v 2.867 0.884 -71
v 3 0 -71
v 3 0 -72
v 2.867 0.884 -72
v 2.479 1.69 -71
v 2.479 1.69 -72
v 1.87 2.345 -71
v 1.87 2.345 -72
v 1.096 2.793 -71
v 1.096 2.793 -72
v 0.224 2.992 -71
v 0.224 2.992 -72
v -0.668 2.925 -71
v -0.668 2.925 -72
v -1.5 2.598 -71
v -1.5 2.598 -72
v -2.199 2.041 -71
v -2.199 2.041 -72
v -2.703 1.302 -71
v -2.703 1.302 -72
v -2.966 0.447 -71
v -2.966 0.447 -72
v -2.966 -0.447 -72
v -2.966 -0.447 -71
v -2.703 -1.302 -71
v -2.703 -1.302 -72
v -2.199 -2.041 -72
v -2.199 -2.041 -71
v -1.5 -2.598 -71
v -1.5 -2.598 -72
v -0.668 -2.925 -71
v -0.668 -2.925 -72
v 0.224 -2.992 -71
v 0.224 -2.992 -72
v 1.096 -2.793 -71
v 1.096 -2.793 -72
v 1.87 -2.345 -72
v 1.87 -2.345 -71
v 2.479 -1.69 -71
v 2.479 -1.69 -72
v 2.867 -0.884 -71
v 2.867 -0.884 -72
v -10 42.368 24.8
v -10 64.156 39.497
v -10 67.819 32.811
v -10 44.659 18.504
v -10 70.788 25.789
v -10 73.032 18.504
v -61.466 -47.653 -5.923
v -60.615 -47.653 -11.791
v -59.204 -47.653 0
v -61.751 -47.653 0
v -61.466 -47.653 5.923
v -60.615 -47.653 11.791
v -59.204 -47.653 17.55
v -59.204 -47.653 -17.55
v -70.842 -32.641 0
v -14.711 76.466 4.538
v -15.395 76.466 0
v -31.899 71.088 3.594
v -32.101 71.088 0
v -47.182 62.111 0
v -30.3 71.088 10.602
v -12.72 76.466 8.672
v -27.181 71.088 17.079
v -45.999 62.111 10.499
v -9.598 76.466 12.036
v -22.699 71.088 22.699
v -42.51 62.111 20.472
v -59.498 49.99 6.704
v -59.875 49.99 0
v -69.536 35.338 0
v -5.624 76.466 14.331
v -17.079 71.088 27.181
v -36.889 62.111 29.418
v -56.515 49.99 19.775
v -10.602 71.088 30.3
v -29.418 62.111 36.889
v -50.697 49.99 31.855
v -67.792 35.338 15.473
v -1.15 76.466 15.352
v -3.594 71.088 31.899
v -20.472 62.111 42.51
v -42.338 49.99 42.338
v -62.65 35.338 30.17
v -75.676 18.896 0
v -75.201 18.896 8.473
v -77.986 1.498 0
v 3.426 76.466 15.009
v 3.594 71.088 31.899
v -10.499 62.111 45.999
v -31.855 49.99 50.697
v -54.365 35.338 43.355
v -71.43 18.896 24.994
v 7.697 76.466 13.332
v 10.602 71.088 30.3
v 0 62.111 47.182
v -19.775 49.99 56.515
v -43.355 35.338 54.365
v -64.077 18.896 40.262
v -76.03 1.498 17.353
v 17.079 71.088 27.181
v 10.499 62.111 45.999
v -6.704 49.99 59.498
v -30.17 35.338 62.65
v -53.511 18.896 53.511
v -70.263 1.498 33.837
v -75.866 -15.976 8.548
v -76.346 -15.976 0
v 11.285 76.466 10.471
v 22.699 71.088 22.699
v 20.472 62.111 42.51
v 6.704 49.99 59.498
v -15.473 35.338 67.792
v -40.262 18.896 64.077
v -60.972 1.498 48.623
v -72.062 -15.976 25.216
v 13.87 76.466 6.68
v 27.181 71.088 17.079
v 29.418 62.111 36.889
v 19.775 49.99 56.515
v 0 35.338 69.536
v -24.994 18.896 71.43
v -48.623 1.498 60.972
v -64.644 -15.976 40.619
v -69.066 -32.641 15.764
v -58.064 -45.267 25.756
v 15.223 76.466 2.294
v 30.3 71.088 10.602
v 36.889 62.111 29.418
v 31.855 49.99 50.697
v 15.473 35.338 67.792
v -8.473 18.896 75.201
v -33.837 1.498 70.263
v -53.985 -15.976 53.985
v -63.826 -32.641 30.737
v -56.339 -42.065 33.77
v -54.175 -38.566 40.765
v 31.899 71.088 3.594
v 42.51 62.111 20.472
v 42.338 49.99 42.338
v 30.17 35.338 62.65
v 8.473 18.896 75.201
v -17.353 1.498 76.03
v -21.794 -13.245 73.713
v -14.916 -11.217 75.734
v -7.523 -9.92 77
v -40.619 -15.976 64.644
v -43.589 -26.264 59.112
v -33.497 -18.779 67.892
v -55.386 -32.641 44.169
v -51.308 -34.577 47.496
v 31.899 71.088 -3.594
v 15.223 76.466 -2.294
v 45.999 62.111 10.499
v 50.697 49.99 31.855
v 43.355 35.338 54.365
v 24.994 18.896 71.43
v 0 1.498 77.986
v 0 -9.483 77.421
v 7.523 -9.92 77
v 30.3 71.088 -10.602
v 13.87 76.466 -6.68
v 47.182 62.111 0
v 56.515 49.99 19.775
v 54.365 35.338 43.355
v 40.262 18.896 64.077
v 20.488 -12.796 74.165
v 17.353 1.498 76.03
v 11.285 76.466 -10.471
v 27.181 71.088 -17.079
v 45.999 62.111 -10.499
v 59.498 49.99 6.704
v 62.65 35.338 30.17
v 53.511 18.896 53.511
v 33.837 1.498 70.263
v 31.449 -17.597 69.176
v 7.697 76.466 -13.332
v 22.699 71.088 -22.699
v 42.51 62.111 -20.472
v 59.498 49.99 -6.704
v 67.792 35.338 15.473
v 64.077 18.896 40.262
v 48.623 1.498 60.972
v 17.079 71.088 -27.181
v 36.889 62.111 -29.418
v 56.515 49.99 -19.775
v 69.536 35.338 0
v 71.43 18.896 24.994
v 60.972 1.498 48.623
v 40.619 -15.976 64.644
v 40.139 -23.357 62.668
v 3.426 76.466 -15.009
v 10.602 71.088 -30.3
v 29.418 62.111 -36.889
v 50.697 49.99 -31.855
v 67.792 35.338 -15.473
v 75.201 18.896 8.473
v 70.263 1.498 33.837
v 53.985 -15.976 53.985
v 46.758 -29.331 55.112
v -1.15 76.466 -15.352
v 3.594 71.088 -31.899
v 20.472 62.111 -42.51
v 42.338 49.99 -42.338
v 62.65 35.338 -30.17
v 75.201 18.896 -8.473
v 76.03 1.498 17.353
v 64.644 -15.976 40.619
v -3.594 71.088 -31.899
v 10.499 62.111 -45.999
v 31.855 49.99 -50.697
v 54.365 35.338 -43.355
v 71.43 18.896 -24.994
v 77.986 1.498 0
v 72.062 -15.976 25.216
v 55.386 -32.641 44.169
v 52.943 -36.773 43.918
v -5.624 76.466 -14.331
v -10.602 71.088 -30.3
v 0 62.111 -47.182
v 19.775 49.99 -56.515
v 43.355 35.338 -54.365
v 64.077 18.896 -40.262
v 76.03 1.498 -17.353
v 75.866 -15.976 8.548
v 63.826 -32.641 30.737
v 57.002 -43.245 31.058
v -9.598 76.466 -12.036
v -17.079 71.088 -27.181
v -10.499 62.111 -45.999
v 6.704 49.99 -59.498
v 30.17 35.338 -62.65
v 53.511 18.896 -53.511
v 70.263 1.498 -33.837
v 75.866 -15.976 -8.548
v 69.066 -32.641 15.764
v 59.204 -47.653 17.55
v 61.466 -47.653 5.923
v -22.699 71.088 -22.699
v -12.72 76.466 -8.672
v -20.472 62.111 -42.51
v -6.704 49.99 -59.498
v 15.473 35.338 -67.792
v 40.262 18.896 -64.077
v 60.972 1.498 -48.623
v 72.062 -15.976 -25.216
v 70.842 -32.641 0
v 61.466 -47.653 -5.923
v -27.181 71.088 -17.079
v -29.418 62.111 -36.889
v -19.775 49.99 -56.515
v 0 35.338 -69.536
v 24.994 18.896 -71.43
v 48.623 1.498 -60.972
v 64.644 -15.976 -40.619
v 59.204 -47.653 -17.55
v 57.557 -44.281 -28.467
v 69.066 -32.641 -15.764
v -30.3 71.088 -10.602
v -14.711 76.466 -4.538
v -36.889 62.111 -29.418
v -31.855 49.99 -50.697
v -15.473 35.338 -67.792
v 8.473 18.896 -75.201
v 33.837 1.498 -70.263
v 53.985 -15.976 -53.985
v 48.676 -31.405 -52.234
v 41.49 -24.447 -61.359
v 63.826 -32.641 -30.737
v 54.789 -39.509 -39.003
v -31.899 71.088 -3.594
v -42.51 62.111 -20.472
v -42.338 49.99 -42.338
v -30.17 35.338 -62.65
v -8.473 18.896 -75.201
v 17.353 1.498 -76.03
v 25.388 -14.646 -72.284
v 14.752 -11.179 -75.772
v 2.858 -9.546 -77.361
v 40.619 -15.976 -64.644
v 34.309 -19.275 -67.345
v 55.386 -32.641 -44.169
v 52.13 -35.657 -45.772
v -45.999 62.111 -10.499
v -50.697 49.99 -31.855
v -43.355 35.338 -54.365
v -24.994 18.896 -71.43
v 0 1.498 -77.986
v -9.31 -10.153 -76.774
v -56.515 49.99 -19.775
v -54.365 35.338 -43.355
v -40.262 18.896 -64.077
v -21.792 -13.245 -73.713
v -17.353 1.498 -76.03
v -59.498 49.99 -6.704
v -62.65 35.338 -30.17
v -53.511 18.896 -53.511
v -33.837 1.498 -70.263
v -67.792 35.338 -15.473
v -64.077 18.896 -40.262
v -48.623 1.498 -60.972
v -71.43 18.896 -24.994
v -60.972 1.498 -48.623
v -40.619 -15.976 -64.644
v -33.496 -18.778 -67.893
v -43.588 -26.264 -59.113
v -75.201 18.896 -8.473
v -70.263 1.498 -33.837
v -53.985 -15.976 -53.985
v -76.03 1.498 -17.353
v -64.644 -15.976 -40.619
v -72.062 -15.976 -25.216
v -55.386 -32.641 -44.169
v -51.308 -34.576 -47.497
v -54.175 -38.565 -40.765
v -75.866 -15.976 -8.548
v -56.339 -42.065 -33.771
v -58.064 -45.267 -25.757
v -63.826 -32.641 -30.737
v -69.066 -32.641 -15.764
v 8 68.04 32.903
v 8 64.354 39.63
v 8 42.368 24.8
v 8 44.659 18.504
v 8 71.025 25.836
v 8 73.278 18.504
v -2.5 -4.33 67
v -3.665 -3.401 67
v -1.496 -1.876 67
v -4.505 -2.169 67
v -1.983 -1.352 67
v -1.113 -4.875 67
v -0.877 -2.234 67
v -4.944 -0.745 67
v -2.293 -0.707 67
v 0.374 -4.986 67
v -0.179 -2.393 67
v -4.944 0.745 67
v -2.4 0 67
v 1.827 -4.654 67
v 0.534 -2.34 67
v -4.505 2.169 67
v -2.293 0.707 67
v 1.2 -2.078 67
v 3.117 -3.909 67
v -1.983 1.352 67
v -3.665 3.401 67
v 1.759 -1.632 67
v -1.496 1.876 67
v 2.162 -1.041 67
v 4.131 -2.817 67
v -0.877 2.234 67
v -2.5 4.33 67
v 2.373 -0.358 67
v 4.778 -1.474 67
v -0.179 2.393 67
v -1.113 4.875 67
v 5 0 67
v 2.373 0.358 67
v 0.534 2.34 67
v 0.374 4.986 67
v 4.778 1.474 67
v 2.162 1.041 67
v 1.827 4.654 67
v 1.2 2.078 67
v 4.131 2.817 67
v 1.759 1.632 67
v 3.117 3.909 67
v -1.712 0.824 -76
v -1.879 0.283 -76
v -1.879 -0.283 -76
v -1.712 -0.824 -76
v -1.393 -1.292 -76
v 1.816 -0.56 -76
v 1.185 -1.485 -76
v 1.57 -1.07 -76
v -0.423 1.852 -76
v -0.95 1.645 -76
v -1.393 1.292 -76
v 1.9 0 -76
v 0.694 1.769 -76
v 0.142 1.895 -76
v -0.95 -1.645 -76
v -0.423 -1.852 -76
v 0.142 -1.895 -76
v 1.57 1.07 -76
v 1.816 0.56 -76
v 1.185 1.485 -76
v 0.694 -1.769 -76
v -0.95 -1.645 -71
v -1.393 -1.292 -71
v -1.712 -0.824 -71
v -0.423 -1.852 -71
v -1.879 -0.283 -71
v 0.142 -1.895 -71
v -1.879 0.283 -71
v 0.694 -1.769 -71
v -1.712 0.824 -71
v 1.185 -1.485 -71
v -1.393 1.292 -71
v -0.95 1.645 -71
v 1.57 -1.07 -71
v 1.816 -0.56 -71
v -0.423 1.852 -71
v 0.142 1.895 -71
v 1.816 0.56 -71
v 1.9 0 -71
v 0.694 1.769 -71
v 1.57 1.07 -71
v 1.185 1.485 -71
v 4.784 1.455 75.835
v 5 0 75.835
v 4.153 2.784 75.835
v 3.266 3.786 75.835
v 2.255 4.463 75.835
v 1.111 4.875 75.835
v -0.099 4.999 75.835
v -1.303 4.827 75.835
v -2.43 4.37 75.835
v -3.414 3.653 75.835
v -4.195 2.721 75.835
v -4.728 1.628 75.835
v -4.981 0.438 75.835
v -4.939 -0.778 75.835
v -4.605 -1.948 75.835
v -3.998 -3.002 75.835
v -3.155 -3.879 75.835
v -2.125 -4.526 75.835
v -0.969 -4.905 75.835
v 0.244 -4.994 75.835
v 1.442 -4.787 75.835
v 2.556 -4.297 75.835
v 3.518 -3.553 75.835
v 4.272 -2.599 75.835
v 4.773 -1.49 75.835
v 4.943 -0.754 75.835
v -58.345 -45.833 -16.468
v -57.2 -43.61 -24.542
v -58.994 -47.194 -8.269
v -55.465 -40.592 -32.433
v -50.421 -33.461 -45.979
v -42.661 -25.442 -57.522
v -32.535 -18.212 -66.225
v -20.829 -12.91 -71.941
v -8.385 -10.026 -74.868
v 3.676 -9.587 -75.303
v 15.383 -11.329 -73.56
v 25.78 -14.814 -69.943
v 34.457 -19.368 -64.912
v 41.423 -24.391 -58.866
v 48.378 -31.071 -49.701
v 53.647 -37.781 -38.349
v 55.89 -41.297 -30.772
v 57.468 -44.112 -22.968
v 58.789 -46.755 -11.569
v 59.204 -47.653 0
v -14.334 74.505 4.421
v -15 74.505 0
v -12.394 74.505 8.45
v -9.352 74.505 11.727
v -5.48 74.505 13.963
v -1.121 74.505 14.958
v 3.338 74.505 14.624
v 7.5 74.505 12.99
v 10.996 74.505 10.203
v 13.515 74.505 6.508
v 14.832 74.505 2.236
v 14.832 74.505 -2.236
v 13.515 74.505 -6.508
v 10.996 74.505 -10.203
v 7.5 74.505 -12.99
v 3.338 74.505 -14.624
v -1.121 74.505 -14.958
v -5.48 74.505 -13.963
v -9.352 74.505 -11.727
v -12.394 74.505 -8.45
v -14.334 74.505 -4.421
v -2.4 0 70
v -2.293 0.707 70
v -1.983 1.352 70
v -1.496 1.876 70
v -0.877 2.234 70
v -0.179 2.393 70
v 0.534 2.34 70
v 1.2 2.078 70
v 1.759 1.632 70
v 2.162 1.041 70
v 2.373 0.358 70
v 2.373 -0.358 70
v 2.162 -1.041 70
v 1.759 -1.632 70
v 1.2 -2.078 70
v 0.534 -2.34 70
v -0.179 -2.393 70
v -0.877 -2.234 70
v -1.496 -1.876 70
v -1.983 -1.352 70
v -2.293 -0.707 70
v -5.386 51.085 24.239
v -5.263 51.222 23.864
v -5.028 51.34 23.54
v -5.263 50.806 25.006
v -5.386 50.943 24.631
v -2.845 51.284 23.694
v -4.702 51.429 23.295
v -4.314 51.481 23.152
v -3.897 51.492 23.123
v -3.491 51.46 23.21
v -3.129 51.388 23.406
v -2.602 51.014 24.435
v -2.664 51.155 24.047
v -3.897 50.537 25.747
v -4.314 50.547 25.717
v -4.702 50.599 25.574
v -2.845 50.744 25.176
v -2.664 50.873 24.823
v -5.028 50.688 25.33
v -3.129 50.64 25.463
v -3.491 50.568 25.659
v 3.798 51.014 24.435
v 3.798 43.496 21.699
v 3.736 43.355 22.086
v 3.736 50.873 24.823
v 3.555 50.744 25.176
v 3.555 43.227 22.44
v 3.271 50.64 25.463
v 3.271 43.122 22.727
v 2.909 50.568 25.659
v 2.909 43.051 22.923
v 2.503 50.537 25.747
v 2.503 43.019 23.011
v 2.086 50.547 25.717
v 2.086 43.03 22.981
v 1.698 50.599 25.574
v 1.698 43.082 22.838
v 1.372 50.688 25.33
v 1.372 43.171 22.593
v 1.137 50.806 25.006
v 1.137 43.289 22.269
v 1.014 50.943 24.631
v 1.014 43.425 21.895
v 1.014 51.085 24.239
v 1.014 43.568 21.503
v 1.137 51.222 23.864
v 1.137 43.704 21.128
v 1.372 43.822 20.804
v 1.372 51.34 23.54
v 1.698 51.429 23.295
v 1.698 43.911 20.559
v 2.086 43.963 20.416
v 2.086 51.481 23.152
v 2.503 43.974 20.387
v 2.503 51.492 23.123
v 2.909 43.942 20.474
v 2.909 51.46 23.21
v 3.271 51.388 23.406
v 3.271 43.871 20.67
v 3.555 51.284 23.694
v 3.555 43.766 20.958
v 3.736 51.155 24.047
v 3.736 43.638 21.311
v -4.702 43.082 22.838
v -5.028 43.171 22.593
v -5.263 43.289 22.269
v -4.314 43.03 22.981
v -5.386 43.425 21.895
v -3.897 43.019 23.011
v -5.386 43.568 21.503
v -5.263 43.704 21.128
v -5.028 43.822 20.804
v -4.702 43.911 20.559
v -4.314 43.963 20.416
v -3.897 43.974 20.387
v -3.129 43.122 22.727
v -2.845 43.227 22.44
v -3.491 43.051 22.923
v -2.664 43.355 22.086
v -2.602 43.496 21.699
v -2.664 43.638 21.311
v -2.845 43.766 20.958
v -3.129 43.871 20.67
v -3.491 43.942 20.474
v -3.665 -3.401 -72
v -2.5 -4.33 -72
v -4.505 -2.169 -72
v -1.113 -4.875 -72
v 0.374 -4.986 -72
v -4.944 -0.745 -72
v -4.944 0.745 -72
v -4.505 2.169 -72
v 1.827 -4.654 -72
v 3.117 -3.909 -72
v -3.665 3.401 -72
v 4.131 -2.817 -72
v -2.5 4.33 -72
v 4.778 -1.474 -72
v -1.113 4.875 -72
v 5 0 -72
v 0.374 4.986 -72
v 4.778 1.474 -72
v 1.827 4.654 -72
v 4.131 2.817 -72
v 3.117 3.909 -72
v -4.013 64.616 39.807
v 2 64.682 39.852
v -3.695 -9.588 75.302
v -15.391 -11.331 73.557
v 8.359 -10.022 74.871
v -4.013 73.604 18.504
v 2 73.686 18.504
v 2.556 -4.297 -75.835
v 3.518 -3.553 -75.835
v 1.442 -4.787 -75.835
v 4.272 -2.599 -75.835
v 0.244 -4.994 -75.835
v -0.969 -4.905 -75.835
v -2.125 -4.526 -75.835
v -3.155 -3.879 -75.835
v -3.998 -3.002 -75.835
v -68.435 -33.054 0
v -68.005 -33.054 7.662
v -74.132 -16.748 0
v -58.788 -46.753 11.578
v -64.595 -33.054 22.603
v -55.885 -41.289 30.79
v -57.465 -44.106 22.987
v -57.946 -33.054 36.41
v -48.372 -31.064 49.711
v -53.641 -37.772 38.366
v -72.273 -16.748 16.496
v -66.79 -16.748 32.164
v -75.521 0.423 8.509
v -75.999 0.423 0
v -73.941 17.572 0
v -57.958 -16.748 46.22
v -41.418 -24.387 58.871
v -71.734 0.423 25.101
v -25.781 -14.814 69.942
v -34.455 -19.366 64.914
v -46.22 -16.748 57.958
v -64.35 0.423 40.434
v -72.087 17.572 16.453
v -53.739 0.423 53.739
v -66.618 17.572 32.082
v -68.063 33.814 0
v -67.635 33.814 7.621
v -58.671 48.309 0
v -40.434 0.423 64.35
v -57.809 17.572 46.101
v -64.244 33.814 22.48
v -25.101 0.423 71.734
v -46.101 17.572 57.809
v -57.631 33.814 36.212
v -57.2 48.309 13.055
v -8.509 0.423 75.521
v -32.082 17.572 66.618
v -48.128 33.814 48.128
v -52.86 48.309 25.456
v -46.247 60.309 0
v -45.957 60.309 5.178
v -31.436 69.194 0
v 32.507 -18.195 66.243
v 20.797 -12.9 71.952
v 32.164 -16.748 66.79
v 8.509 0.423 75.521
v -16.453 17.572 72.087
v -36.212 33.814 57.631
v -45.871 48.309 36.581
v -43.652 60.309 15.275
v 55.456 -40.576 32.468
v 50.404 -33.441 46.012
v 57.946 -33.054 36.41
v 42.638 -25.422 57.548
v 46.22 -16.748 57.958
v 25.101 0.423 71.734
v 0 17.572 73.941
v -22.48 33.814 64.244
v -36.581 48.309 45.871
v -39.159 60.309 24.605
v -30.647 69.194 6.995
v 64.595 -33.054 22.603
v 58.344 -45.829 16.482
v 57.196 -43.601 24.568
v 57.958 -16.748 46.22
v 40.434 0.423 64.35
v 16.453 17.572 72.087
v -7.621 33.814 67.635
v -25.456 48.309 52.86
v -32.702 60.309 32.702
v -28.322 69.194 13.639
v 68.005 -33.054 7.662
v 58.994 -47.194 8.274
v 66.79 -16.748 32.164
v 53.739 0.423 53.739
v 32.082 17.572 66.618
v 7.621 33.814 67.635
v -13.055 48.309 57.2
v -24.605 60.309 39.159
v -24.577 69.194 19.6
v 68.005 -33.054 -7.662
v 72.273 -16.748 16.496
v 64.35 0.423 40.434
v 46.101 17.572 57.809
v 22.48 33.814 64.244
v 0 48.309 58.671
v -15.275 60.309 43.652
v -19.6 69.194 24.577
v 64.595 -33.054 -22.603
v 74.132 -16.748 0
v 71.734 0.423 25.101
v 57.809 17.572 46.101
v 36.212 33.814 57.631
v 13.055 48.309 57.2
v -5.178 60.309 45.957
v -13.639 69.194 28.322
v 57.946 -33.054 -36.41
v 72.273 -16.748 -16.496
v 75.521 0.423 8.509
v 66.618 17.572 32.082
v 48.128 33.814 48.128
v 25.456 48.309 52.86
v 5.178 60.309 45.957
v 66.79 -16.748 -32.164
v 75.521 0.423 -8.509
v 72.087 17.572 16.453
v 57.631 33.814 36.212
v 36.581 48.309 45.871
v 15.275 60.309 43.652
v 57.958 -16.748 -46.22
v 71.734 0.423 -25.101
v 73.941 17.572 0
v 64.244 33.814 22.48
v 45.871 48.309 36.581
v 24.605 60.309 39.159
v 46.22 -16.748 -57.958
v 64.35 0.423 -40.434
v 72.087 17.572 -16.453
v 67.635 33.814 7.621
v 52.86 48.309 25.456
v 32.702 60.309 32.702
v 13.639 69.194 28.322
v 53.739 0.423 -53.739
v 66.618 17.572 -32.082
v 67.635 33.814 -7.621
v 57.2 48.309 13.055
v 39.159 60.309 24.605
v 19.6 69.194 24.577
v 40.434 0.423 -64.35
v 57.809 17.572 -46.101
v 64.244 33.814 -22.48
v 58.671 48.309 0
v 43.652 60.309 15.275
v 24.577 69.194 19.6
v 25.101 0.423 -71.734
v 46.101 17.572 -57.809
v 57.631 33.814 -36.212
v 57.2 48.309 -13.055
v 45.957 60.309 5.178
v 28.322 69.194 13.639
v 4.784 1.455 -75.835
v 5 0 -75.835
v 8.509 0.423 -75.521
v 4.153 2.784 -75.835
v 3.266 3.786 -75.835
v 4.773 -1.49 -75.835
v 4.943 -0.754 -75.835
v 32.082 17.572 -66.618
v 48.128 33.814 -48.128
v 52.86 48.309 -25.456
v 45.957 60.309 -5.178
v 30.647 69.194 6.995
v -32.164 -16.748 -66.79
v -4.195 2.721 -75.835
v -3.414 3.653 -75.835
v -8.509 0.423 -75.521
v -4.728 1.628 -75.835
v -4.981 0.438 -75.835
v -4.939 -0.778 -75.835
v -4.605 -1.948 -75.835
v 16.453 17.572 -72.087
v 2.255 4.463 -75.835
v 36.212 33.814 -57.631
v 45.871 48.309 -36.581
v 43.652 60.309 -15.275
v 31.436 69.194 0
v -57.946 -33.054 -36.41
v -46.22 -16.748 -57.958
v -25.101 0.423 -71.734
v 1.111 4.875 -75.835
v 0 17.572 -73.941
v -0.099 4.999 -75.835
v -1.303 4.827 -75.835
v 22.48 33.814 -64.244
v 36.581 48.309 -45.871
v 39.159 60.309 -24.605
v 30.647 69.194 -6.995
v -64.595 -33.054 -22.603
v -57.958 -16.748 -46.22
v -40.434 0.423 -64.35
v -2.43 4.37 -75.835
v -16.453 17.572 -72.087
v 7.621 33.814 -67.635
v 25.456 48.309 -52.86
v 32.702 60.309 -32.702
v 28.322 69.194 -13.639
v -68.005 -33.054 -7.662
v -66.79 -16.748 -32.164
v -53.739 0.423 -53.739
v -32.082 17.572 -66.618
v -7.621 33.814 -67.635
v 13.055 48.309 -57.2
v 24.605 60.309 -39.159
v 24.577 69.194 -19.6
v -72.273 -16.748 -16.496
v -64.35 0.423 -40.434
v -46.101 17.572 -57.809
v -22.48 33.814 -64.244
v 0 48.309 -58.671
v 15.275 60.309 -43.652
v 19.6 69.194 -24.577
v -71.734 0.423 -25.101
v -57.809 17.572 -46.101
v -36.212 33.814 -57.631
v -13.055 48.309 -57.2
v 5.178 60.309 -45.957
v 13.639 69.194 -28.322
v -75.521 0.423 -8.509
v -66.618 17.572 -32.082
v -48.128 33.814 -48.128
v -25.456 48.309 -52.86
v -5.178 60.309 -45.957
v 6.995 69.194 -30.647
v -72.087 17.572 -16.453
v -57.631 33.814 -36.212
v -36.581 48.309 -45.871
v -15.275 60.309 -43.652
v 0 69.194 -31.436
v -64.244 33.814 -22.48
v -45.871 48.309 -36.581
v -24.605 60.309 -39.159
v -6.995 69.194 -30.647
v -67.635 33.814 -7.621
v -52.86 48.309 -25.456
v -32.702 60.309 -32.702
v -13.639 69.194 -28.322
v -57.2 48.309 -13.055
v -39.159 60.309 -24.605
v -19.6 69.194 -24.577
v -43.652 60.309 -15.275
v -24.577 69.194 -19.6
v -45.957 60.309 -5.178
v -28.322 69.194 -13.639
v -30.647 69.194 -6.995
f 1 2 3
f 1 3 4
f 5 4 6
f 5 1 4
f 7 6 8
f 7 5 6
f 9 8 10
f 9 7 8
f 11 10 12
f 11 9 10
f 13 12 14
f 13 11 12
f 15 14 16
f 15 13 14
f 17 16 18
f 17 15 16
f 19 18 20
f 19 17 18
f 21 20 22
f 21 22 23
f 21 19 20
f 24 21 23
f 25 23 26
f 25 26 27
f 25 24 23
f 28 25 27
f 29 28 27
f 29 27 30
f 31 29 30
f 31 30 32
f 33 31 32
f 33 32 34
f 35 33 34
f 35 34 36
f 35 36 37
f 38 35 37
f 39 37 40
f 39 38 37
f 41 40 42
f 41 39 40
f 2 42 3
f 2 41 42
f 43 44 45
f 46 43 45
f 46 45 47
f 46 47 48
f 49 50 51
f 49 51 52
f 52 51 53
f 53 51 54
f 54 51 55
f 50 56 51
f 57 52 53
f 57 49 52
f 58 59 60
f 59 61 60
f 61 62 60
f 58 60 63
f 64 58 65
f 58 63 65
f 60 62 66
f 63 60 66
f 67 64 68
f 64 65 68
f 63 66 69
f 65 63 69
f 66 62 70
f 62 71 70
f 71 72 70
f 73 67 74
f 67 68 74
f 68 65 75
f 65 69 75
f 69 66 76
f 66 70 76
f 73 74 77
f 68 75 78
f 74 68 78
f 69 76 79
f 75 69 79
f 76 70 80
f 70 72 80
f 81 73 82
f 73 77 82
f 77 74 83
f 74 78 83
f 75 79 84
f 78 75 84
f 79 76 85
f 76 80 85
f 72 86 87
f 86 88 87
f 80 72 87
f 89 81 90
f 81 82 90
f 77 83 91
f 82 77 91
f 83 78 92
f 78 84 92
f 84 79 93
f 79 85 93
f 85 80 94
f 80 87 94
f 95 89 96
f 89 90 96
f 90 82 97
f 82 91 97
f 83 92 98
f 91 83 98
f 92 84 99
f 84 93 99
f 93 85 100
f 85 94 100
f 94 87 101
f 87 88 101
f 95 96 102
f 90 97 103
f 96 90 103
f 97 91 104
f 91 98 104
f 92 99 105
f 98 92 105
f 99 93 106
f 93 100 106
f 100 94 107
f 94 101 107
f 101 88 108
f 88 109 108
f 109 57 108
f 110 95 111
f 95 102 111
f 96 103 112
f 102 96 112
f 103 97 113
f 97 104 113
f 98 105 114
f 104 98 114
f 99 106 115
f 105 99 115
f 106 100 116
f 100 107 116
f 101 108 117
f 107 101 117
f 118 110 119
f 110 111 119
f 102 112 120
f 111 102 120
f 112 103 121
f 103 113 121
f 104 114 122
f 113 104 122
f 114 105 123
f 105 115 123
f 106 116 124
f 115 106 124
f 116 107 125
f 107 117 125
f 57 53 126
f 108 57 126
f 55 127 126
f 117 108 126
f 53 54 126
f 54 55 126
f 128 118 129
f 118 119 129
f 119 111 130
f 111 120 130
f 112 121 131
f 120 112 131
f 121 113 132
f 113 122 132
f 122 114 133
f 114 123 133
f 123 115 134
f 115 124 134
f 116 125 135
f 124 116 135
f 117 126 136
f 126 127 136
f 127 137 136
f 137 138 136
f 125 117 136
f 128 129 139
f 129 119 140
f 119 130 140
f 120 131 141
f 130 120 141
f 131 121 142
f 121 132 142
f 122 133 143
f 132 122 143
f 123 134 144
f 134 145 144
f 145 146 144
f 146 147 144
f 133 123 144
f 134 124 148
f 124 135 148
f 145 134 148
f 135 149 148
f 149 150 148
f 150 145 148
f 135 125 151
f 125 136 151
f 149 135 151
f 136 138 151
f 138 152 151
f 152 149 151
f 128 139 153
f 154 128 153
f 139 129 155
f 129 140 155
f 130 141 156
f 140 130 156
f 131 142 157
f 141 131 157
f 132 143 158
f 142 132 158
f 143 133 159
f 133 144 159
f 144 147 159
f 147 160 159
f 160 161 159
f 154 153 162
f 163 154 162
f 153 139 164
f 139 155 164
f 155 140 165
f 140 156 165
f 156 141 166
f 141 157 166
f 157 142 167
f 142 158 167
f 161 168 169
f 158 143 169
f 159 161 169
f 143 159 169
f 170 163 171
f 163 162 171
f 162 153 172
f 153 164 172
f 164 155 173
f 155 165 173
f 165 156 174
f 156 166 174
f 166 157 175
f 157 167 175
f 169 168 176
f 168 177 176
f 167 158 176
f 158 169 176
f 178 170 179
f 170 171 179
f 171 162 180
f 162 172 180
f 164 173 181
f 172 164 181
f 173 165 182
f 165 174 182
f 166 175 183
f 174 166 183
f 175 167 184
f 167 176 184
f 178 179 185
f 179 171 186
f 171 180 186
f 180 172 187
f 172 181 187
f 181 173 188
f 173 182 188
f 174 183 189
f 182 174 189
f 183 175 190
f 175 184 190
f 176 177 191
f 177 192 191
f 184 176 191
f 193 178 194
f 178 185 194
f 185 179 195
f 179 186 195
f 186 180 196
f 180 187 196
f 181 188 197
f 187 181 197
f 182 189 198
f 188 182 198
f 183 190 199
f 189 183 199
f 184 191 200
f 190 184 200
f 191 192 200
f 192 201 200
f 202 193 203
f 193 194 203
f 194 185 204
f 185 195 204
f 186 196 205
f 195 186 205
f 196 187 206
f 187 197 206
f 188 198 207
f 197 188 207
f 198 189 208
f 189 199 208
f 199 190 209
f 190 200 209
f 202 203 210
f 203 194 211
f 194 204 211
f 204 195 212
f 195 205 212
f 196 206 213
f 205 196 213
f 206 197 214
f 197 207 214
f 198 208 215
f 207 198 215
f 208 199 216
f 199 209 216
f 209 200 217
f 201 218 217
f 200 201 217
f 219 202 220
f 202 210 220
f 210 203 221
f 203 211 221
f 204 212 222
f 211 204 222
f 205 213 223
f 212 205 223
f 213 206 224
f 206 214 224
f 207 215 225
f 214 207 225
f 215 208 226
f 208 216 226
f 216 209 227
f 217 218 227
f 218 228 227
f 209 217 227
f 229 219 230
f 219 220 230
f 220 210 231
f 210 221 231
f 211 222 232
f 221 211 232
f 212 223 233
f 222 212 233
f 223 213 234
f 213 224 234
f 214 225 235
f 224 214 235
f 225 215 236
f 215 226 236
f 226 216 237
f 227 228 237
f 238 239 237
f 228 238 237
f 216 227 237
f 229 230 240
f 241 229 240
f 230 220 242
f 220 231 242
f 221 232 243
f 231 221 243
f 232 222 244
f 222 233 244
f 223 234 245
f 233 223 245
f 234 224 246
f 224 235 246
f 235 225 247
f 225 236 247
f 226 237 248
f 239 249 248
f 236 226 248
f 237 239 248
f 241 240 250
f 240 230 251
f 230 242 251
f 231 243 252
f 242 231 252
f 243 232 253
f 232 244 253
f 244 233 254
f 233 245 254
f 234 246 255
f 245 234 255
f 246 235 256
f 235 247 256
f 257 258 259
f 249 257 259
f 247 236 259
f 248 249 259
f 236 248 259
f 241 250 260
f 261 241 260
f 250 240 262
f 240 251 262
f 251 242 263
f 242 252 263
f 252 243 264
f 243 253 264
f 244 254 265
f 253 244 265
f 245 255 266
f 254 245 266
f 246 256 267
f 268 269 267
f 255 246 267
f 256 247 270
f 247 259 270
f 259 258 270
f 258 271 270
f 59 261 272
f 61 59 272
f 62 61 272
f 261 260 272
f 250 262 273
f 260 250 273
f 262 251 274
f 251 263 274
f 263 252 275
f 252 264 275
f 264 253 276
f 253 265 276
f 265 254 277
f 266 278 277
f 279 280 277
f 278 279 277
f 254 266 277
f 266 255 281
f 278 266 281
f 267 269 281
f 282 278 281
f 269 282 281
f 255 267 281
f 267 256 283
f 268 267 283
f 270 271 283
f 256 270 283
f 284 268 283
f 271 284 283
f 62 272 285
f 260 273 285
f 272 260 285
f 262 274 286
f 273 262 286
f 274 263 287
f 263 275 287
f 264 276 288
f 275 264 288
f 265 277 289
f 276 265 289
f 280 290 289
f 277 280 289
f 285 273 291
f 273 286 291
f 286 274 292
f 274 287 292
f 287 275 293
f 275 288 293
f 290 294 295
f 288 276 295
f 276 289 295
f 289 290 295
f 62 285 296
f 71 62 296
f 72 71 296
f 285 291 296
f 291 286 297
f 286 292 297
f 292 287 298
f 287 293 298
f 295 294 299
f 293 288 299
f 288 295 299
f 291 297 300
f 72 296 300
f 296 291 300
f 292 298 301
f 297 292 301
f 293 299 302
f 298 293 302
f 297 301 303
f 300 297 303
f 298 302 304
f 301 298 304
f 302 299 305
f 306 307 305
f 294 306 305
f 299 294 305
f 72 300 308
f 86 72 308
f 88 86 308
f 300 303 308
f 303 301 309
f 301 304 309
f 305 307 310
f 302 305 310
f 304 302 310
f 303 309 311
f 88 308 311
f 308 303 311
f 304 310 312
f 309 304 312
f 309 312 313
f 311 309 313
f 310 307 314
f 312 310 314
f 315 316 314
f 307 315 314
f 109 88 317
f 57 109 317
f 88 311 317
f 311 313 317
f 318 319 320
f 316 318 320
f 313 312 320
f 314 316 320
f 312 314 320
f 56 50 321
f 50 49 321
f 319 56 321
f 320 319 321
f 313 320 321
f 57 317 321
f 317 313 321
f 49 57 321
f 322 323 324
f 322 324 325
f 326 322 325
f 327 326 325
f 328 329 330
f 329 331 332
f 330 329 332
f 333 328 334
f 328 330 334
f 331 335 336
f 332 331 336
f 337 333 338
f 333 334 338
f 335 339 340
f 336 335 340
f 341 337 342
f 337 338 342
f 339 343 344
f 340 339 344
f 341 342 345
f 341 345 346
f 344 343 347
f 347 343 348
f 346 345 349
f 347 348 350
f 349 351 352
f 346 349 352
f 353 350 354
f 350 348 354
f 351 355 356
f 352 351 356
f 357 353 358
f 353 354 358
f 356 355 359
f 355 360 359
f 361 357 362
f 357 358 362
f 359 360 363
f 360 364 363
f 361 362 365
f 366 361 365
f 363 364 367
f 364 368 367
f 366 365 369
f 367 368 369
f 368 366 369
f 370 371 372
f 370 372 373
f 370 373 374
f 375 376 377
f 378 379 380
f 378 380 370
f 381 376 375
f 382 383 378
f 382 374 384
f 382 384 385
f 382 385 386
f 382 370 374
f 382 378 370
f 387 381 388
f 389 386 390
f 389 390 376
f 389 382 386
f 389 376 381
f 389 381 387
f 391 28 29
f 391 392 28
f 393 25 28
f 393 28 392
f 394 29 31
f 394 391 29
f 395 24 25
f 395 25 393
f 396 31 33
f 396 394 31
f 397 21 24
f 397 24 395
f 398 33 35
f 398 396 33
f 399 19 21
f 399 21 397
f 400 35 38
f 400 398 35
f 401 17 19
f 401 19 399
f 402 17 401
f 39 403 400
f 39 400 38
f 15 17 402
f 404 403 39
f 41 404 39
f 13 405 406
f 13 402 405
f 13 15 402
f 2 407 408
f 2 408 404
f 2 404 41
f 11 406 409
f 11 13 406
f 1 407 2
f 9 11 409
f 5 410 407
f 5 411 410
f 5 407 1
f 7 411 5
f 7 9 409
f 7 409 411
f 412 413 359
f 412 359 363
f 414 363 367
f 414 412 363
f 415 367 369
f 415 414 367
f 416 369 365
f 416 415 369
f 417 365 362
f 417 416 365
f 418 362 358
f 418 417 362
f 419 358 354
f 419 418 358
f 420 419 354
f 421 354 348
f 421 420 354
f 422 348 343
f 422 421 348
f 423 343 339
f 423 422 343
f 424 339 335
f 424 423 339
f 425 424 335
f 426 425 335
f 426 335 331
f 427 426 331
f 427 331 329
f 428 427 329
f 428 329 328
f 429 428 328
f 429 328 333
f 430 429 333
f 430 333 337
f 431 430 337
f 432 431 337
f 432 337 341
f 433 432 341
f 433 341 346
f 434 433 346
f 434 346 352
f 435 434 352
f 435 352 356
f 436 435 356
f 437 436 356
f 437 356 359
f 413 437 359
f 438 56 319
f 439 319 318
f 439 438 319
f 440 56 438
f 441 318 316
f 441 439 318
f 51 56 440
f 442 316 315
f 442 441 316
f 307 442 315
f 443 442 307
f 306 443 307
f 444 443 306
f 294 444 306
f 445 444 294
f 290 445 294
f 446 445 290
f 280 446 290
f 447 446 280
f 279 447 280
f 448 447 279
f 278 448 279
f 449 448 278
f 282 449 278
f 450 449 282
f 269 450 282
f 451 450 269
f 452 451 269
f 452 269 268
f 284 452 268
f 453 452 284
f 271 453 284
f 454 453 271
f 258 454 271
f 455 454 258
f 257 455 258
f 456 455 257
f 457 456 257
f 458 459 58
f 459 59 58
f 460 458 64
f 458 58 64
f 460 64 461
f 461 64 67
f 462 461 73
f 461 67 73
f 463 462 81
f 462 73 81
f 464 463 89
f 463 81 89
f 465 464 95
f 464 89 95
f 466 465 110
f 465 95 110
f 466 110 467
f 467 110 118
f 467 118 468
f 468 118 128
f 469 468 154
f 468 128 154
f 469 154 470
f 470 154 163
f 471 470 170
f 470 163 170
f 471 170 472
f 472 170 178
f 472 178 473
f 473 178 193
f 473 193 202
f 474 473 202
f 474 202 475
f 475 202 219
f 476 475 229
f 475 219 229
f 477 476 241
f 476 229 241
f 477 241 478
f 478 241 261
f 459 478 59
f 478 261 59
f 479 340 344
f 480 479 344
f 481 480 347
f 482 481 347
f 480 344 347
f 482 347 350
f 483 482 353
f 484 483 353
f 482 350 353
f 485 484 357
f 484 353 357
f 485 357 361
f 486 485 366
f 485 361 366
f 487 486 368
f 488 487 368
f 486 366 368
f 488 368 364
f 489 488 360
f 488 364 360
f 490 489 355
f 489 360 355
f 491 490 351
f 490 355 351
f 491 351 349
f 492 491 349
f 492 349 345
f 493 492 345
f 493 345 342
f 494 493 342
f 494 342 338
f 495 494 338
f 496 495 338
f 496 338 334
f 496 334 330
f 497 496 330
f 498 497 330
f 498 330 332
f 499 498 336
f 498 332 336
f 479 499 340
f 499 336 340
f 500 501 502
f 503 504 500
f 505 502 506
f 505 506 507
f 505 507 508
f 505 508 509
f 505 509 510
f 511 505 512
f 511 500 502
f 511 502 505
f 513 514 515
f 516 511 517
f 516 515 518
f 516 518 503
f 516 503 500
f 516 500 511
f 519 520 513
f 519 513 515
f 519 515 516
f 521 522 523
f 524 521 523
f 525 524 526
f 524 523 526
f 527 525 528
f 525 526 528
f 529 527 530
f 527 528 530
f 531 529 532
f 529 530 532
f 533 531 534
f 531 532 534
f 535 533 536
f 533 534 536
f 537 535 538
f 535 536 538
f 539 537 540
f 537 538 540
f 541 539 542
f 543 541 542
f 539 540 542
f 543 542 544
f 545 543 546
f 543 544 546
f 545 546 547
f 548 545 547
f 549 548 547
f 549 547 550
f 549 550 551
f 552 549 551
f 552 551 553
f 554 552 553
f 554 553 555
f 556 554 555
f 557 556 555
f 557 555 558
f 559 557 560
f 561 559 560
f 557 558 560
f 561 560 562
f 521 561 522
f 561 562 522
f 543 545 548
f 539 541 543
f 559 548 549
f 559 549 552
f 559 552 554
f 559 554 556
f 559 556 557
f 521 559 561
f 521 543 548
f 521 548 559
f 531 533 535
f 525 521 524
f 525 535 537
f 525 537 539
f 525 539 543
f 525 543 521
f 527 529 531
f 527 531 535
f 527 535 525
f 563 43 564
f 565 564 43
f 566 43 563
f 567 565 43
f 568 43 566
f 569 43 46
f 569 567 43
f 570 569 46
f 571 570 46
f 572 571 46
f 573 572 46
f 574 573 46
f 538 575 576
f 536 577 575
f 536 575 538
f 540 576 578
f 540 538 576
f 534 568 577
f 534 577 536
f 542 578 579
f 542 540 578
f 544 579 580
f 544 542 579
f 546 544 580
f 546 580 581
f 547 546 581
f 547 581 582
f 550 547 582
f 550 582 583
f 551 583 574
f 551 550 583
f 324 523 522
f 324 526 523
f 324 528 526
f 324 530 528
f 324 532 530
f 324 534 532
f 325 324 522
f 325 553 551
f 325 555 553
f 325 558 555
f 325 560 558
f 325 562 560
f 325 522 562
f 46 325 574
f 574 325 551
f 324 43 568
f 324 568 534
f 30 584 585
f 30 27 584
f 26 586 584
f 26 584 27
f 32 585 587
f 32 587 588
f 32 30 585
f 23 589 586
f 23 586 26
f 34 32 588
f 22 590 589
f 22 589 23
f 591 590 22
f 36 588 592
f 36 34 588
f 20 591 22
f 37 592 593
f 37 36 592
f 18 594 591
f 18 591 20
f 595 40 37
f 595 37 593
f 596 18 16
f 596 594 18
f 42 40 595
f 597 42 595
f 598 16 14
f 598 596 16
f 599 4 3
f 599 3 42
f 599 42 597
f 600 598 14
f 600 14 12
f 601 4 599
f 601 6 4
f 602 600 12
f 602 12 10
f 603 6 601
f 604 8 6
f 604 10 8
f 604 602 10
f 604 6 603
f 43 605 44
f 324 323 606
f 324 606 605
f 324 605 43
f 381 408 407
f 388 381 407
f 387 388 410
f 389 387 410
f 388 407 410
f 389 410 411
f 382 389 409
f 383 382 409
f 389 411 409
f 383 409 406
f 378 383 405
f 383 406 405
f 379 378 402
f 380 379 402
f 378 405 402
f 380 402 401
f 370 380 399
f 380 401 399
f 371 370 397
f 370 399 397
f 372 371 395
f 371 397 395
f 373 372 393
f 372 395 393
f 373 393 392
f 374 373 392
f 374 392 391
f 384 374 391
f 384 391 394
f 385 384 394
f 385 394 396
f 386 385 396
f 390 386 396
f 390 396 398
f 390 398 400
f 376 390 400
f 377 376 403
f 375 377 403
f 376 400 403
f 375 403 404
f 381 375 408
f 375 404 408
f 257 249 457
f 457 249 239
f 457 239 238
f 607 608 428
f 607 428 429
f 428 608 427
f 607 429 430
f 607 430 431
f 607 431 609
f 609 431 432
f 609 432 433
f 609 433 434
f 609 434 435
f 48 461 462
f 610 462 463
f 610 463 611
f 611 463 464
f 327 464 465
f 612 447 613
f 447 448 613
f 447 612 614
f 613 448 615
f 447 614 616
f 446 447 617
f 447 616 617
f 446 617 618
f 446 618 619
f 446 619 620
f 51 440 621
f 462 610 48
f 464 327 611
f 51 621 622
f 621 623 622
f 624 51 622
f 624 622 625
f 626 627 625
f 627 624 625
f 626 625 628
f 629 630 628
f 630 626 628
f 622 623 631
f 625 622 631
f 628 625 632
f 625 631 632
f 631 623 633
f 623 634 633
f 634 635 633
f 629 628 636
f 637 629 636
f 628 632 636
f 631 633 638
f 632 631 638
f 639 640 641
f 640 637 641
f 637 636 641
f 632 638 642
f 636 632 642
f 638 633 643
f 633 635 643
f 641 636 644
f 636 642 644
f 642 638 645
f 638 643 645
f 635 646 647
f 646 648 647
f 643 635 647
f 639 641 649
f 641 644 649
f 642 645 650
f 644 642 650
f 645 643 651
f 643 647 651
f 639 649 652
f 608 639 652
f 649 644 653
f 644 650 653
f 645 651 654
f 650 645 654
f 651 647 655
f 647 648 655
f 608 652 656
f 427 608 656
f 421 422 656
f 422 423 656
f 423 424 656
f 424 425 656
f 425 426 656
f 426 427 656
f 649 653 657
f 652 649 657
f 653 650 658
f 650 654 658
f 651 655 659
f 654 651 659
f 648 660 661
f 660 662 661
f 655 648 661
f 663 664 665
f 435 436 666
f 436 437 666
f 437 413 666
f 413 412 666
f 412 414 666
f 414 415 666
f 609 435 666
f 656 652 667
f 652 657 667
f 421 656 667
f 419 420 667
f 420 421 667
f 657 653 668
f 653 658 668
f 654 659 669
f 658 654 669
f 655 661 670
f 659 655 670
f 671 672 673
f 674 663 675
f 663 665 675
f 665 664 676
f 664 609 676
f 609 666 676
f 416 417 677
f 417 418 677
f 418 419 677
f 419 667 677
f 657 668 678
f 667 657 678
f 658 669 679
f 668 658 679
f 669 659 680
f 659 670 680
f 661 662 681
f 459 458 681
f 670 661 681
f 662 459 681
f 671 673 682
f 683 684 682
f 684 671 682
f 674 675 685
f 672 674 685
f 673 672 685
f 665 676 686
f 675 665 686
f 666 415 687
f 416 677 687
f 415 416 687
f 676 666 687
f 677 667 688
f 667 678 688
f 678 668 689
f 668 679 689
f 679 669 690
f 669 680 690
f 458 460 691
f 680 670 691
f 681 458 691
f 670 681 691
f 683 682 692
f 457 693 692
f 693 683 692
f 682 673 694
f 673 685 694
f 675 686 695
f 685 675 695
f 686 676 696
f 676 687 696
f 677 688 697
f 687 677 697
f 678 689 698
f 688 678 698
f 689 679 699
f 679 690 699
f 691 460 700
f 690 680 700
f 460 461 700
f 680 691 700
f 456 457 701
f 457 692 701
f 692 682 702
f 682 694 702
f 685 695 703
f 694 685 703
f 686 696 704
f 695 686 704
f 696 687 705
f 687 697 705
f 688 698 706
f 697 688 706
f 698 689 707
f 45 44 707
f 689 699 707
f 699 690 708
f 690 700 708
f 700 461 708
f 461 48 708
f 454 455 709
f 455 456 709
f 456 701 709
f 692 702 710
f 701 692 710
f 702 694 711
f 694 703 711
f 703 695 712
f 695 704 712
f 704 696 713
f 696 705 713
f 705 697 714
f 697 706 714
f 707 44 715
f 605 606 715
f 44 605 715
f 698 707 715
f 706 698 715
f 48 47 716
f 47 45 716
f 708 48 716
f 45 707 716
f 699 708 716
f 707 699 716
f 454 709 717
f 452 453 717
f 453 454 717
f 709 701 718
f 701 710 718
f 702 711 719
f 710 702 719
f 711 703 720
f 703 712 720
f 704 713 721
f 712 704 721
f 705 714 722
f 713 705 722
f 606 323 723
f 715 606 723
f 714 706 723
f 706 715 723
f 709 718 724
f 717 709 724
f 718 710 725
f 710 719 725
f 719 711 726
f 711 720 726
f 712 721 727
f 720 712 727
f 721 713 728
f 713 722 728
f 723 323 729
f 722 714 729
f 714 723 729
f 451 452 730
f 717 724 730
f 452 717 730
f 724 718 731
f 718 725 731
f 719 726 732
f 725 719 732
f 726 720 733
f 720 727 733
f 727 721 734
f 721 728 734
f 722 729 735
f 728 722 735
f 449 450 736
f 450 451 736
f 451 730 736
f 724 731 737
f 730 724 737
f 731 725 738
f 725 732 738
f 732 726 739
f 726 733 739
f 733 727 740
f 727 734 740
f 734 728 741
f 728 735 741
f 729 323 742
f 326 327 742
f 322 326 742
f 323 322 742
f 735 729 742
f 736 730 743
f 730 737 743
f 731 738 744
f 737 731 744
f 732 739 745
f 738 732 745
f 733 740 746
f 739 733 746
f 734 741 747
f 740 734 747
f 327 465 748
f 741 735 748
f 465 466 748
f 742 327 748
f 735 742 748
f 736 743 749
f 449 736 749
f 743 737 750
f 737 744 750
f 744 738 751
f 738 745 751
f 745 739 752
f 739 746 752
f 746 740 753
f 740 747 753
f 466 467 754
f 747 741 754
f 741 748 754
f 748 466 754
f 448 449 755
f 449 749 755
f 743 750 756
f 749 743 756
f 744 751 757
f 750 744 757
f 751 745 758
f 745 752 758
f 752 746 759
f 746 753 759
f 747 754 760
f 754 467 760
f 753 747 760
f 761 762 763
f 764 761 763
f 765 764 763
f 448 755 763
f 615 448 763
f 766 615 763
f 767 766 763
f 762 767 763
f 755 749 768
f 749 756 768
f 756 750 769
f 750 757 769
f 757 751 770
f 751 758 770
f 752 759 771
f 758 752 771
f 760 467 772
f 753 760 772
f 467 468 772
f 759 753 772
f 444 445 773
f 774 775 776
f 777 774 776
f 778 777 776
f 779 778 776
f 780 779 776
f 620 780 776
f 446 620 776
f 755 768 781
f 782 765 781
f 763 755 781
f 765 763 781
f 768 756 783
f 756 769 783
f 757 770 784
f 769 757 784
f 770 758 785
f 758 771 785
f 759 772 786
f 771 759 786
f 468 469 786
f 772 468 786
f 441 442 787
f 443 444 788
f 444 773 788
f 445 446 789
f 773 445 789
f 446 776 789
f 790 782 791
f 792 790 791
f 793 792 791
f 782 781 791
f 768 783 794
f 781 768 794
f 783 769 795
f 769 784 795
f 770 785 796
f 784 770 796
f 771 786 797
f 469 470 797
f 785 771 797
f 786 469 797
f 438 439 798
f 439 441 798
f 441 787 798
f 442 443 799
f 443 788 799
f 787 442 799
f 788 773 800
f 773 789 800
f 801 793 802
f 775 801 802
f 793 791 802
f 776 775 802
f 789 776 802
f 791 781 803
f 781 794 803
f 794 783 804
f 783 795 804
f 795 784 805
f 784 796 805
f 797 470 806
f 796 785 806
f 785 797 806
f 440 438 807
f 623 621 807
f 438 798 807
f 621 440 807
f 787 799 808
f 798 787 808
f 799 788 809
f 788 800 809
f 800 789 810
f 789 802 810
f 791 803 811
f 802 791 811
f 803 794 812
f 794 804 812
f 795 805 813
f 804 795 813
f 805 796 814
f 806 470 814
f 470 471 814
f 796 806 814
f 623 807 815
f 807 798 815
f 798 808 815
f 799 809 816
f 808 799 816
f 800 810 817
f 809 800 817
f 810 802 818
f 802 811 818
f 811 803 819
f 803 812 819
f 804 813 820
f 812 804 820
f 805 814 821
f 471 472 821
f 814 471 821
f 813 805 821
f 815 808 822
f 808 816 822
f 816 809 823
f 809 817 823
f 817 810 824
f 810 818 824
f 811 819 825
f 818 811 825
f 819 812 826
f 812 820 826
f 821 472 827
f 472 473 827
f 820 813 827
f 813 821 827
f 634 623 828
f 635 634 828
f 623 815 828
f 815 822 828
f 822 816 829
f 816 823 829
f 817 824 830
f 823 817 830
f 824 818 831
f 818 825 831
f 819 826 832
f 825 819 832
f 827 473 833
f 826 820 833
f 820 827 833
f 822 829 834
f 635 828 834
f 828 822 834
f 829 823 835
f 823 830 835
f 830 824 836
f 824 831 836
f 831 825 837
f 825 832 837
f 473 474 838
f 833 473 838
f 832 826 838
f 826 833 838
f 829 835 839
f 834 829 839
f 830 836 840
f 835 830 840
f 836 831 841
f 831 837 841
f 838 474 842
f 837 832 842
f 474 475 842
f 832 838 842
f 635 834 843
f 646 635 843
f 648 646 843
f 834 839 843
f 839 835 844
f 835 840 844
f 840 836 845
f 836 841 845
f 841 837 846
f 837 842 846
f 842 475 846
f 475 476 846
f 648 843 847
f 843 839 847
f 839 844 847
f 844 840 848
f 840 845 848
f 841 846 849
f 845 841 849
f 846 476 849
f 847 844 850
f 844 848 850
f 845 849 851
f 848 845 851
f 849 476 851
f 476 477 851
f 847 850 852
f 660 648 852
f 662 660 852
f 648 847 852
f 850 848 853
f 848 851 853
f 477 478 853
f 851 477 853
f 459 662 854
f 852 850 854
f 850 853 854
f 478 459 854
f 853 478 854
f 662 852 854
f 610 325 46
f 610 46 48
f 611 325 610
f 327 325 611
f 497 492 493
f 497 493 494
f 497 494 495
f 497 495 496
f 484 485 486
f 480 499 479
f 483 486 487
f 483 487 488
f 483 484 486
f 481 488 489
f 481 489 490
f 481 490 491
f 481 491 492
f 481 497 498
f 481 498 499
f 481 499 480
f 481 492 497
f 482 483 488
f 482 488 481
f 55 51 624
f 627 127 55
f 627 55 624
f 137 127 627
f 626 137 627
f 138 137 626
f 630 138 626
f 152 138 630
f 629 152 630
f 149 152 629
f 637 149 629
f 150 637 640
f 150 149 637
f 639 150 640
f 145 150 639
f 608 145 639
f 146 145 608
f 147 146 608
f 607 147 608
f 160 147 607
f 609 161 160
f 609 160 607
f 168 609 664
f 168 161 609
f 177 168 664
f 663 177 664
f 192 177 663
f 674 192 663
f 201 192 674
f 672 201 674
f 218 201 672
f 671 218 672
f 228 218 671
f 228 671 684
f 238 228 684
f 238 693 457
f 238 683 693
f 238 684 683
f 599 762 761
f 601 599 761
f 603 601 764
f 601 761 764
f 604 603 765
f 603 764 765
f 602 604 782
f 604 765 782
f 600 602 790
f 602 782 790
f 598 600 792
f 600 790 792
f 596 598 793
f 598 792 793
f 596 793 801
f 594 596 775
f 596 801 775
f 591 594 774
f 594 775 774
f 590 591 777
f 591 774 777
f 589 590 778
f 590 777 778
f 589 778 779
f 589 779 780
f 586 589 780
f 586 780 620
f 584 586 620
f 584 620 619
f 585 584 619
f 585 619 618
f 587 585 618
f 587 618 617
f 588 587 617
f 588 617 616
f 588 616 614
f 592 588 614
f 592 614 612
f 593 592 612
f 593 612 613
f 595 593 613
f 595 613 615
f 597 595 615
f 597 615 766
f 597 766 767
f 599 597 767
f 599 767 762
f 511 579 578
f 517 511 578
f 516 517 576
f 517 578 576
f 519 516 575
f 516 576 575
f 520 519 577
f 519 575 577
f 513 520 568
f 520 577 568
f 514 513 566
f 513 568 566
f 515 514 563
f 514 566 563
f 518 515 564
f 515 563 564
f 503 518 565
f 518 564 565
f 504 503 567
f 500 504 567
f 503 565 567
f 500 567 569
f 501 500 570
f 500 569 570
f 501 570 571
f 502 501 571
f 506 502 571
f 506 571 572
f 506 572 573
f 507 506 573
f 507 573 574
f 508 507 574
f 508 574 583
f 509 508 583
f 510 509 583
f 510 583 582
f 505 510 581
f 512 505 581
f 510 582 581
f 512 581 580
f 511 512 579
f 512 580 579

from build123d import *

# Parameters (mm, degrees)
SKETCH2_R                = 5
BOSS_EXTRUDE1_DEPTH      = 10
SKETCH5_R                = 2.4
CUT_EXTRUDE2_DEPTH       = 3
CUT_EXTRUDE5_DEPTH       = 2
CUT_EXTRUDE5_DEPTH_BACK  = 156
BOSS_EXTRUDE2_DEPTH      = 8
BOSS_EXTRUDE2_DEPTH_BACK = 10
SKETCH10_R               = 1.4
CUT_EXTRUDE6_DEPTH       = 8
SKETCH11_R               = 5
BOSS_EXTRUDE3_DEPTH      = 6
SKETCH12_R               = 5
SKETCH12_R_2             = 3
CUT_EXTRUDE8_DEPTH       = 1
SKETCH13_R               = 1.9
CUT_EXTRUDE9_DEPTH       = 5


with BuildPart() as part:
    # Sketch1 → Revolve1 (revolve)
    with BuildSketch(Plane.XY):
        with BuildLine():
            Line((-61.750890187, -47.653200953), (-59.204496779, -47.653200953))
            ThreePointArc((-59.204496779, -47.653200953), (-71.464924193, 25.860483564), (-15, 74.505033387))
            Line((-15, 74.505033387), (-15.394736842, 76.46569216))
            ThreePointArc((-15.394736842, 76.46569216), (-73.070081767, 27.290349038), (-61.750890187, -47.653200953))
        make_face()
    revolve(axis=Axis((0, 0, 0), (0, 1, 0)))

    # Sketch2 → Boss-Extrude1 (add)
    with BuildSketch(Plane.XY.offset(77)):
        Circle(SKETCH2_R)
    extrude(amount=-BOSS_EXTRUDE1_DEPTH)

    # Sketch5 → Cut-Extrude2 (cut)
    with BuildSketch(Plane(origin=(0, 0, 67), x_dir=(-1, 0, 0), z_dir=(0, 0, -1))):
        Circle(SKETCH5_R)
    extrude(amount=-CUT_EXTRUDE2_DEPTH, mode=Mode.SUBTRACT)

    # Sketch8 → Cut-Extrude5 (cut, two sides)
    with BuildSketch(Plane.XY.offset(77)) as cut_extrude5_sk:
        with BuildLine():
            Line((59.204496779, -47.653200953), (-59.204496779, -47.653200953))
            ThreePointArc((-59.204496779, -47.653200953), (0, -9.482803282), (59.204496779, -47.653200953))
        make_face()
    extrude(amount=CUT_EXTRUDE5_DEPTH, mode=Mode.SUBTRACT)
    extrude(cut_extrude5_sk.sketch, amount=-CUT_EXTRUDE5_DEPTH_BACK, mode=Mode.SUBTRACT)

    # Sketch9 → Boss-Extrude2 (add, two sides)
    with BuildSketch(Plane(origin=(0, 0, 0), x_dir=(0, 0, -1), z_dir=(1, 0, 0))) as boss_extrude2_sk:
        Polygon((-24.799638763, 42.367833372), (-18.503698204, 44.659368332), (-18.503698204, 74.505033387), (-27.09103143, 71.379499701), (-35.489739706, 67.690470627), (-39.978084848, 64.869225109), align=None)
    extrude(amount=BOSS_EXTRUDE2_DEPTH)
    extrude(boss_extrude2_sk.sketch, amount=-BOSS_EXTRUDE2_DEPTH_BACK)

    # Sketch10 → Cut-Extrude6 (cut)
    with BuildSketch(Plane(origin=(0, 45.382188608, 16.517765819), x_dir=(1, 0, 0), z_dir=(0, -0.939692621, -0.342020143))):
        with Locations((-4.00206731, 5.513385102)):
            Circle(SKETCH10_R)
        with Locations((2.39793269, 5.513385102)):
            Circle(SKETCH10_R)
    extrude(amount=-CUT_EXTRUDE6_DEPTH, mode=Mode.SUBTRACT)

    # Sketch11 → Boss-Extrude3 (add)
    with BuildSketch(Plane.XY.offset(-77)):
        Circle(SKETCH11_R)
    extrude(amount=BOSS_EXTRUDE3_DEPTH)

    # Sketch12 → Cut-Extrude8 (cut)
    with BuildSketch(Plane.XY.offset(-71)):
        Circle(SKETCH12_R)
        Circle(SKETCH12_R_2, mode=Mode.SUBTRACT)
    extrude(amount=-CUT_EXTRUDE8_DEPTH, mode=Mode.SUBTRACT)

    # Sketch13 → Cut-Extrude9 (cut)
    with BuildSketch(Plane.XY.offset(-71)):
        Circle(SKETCH13_R)
    extrude(amount=-CUT_EXTRUDE9_DEPTH, mode=Mode.SUBTRACT)


solid = part.part
